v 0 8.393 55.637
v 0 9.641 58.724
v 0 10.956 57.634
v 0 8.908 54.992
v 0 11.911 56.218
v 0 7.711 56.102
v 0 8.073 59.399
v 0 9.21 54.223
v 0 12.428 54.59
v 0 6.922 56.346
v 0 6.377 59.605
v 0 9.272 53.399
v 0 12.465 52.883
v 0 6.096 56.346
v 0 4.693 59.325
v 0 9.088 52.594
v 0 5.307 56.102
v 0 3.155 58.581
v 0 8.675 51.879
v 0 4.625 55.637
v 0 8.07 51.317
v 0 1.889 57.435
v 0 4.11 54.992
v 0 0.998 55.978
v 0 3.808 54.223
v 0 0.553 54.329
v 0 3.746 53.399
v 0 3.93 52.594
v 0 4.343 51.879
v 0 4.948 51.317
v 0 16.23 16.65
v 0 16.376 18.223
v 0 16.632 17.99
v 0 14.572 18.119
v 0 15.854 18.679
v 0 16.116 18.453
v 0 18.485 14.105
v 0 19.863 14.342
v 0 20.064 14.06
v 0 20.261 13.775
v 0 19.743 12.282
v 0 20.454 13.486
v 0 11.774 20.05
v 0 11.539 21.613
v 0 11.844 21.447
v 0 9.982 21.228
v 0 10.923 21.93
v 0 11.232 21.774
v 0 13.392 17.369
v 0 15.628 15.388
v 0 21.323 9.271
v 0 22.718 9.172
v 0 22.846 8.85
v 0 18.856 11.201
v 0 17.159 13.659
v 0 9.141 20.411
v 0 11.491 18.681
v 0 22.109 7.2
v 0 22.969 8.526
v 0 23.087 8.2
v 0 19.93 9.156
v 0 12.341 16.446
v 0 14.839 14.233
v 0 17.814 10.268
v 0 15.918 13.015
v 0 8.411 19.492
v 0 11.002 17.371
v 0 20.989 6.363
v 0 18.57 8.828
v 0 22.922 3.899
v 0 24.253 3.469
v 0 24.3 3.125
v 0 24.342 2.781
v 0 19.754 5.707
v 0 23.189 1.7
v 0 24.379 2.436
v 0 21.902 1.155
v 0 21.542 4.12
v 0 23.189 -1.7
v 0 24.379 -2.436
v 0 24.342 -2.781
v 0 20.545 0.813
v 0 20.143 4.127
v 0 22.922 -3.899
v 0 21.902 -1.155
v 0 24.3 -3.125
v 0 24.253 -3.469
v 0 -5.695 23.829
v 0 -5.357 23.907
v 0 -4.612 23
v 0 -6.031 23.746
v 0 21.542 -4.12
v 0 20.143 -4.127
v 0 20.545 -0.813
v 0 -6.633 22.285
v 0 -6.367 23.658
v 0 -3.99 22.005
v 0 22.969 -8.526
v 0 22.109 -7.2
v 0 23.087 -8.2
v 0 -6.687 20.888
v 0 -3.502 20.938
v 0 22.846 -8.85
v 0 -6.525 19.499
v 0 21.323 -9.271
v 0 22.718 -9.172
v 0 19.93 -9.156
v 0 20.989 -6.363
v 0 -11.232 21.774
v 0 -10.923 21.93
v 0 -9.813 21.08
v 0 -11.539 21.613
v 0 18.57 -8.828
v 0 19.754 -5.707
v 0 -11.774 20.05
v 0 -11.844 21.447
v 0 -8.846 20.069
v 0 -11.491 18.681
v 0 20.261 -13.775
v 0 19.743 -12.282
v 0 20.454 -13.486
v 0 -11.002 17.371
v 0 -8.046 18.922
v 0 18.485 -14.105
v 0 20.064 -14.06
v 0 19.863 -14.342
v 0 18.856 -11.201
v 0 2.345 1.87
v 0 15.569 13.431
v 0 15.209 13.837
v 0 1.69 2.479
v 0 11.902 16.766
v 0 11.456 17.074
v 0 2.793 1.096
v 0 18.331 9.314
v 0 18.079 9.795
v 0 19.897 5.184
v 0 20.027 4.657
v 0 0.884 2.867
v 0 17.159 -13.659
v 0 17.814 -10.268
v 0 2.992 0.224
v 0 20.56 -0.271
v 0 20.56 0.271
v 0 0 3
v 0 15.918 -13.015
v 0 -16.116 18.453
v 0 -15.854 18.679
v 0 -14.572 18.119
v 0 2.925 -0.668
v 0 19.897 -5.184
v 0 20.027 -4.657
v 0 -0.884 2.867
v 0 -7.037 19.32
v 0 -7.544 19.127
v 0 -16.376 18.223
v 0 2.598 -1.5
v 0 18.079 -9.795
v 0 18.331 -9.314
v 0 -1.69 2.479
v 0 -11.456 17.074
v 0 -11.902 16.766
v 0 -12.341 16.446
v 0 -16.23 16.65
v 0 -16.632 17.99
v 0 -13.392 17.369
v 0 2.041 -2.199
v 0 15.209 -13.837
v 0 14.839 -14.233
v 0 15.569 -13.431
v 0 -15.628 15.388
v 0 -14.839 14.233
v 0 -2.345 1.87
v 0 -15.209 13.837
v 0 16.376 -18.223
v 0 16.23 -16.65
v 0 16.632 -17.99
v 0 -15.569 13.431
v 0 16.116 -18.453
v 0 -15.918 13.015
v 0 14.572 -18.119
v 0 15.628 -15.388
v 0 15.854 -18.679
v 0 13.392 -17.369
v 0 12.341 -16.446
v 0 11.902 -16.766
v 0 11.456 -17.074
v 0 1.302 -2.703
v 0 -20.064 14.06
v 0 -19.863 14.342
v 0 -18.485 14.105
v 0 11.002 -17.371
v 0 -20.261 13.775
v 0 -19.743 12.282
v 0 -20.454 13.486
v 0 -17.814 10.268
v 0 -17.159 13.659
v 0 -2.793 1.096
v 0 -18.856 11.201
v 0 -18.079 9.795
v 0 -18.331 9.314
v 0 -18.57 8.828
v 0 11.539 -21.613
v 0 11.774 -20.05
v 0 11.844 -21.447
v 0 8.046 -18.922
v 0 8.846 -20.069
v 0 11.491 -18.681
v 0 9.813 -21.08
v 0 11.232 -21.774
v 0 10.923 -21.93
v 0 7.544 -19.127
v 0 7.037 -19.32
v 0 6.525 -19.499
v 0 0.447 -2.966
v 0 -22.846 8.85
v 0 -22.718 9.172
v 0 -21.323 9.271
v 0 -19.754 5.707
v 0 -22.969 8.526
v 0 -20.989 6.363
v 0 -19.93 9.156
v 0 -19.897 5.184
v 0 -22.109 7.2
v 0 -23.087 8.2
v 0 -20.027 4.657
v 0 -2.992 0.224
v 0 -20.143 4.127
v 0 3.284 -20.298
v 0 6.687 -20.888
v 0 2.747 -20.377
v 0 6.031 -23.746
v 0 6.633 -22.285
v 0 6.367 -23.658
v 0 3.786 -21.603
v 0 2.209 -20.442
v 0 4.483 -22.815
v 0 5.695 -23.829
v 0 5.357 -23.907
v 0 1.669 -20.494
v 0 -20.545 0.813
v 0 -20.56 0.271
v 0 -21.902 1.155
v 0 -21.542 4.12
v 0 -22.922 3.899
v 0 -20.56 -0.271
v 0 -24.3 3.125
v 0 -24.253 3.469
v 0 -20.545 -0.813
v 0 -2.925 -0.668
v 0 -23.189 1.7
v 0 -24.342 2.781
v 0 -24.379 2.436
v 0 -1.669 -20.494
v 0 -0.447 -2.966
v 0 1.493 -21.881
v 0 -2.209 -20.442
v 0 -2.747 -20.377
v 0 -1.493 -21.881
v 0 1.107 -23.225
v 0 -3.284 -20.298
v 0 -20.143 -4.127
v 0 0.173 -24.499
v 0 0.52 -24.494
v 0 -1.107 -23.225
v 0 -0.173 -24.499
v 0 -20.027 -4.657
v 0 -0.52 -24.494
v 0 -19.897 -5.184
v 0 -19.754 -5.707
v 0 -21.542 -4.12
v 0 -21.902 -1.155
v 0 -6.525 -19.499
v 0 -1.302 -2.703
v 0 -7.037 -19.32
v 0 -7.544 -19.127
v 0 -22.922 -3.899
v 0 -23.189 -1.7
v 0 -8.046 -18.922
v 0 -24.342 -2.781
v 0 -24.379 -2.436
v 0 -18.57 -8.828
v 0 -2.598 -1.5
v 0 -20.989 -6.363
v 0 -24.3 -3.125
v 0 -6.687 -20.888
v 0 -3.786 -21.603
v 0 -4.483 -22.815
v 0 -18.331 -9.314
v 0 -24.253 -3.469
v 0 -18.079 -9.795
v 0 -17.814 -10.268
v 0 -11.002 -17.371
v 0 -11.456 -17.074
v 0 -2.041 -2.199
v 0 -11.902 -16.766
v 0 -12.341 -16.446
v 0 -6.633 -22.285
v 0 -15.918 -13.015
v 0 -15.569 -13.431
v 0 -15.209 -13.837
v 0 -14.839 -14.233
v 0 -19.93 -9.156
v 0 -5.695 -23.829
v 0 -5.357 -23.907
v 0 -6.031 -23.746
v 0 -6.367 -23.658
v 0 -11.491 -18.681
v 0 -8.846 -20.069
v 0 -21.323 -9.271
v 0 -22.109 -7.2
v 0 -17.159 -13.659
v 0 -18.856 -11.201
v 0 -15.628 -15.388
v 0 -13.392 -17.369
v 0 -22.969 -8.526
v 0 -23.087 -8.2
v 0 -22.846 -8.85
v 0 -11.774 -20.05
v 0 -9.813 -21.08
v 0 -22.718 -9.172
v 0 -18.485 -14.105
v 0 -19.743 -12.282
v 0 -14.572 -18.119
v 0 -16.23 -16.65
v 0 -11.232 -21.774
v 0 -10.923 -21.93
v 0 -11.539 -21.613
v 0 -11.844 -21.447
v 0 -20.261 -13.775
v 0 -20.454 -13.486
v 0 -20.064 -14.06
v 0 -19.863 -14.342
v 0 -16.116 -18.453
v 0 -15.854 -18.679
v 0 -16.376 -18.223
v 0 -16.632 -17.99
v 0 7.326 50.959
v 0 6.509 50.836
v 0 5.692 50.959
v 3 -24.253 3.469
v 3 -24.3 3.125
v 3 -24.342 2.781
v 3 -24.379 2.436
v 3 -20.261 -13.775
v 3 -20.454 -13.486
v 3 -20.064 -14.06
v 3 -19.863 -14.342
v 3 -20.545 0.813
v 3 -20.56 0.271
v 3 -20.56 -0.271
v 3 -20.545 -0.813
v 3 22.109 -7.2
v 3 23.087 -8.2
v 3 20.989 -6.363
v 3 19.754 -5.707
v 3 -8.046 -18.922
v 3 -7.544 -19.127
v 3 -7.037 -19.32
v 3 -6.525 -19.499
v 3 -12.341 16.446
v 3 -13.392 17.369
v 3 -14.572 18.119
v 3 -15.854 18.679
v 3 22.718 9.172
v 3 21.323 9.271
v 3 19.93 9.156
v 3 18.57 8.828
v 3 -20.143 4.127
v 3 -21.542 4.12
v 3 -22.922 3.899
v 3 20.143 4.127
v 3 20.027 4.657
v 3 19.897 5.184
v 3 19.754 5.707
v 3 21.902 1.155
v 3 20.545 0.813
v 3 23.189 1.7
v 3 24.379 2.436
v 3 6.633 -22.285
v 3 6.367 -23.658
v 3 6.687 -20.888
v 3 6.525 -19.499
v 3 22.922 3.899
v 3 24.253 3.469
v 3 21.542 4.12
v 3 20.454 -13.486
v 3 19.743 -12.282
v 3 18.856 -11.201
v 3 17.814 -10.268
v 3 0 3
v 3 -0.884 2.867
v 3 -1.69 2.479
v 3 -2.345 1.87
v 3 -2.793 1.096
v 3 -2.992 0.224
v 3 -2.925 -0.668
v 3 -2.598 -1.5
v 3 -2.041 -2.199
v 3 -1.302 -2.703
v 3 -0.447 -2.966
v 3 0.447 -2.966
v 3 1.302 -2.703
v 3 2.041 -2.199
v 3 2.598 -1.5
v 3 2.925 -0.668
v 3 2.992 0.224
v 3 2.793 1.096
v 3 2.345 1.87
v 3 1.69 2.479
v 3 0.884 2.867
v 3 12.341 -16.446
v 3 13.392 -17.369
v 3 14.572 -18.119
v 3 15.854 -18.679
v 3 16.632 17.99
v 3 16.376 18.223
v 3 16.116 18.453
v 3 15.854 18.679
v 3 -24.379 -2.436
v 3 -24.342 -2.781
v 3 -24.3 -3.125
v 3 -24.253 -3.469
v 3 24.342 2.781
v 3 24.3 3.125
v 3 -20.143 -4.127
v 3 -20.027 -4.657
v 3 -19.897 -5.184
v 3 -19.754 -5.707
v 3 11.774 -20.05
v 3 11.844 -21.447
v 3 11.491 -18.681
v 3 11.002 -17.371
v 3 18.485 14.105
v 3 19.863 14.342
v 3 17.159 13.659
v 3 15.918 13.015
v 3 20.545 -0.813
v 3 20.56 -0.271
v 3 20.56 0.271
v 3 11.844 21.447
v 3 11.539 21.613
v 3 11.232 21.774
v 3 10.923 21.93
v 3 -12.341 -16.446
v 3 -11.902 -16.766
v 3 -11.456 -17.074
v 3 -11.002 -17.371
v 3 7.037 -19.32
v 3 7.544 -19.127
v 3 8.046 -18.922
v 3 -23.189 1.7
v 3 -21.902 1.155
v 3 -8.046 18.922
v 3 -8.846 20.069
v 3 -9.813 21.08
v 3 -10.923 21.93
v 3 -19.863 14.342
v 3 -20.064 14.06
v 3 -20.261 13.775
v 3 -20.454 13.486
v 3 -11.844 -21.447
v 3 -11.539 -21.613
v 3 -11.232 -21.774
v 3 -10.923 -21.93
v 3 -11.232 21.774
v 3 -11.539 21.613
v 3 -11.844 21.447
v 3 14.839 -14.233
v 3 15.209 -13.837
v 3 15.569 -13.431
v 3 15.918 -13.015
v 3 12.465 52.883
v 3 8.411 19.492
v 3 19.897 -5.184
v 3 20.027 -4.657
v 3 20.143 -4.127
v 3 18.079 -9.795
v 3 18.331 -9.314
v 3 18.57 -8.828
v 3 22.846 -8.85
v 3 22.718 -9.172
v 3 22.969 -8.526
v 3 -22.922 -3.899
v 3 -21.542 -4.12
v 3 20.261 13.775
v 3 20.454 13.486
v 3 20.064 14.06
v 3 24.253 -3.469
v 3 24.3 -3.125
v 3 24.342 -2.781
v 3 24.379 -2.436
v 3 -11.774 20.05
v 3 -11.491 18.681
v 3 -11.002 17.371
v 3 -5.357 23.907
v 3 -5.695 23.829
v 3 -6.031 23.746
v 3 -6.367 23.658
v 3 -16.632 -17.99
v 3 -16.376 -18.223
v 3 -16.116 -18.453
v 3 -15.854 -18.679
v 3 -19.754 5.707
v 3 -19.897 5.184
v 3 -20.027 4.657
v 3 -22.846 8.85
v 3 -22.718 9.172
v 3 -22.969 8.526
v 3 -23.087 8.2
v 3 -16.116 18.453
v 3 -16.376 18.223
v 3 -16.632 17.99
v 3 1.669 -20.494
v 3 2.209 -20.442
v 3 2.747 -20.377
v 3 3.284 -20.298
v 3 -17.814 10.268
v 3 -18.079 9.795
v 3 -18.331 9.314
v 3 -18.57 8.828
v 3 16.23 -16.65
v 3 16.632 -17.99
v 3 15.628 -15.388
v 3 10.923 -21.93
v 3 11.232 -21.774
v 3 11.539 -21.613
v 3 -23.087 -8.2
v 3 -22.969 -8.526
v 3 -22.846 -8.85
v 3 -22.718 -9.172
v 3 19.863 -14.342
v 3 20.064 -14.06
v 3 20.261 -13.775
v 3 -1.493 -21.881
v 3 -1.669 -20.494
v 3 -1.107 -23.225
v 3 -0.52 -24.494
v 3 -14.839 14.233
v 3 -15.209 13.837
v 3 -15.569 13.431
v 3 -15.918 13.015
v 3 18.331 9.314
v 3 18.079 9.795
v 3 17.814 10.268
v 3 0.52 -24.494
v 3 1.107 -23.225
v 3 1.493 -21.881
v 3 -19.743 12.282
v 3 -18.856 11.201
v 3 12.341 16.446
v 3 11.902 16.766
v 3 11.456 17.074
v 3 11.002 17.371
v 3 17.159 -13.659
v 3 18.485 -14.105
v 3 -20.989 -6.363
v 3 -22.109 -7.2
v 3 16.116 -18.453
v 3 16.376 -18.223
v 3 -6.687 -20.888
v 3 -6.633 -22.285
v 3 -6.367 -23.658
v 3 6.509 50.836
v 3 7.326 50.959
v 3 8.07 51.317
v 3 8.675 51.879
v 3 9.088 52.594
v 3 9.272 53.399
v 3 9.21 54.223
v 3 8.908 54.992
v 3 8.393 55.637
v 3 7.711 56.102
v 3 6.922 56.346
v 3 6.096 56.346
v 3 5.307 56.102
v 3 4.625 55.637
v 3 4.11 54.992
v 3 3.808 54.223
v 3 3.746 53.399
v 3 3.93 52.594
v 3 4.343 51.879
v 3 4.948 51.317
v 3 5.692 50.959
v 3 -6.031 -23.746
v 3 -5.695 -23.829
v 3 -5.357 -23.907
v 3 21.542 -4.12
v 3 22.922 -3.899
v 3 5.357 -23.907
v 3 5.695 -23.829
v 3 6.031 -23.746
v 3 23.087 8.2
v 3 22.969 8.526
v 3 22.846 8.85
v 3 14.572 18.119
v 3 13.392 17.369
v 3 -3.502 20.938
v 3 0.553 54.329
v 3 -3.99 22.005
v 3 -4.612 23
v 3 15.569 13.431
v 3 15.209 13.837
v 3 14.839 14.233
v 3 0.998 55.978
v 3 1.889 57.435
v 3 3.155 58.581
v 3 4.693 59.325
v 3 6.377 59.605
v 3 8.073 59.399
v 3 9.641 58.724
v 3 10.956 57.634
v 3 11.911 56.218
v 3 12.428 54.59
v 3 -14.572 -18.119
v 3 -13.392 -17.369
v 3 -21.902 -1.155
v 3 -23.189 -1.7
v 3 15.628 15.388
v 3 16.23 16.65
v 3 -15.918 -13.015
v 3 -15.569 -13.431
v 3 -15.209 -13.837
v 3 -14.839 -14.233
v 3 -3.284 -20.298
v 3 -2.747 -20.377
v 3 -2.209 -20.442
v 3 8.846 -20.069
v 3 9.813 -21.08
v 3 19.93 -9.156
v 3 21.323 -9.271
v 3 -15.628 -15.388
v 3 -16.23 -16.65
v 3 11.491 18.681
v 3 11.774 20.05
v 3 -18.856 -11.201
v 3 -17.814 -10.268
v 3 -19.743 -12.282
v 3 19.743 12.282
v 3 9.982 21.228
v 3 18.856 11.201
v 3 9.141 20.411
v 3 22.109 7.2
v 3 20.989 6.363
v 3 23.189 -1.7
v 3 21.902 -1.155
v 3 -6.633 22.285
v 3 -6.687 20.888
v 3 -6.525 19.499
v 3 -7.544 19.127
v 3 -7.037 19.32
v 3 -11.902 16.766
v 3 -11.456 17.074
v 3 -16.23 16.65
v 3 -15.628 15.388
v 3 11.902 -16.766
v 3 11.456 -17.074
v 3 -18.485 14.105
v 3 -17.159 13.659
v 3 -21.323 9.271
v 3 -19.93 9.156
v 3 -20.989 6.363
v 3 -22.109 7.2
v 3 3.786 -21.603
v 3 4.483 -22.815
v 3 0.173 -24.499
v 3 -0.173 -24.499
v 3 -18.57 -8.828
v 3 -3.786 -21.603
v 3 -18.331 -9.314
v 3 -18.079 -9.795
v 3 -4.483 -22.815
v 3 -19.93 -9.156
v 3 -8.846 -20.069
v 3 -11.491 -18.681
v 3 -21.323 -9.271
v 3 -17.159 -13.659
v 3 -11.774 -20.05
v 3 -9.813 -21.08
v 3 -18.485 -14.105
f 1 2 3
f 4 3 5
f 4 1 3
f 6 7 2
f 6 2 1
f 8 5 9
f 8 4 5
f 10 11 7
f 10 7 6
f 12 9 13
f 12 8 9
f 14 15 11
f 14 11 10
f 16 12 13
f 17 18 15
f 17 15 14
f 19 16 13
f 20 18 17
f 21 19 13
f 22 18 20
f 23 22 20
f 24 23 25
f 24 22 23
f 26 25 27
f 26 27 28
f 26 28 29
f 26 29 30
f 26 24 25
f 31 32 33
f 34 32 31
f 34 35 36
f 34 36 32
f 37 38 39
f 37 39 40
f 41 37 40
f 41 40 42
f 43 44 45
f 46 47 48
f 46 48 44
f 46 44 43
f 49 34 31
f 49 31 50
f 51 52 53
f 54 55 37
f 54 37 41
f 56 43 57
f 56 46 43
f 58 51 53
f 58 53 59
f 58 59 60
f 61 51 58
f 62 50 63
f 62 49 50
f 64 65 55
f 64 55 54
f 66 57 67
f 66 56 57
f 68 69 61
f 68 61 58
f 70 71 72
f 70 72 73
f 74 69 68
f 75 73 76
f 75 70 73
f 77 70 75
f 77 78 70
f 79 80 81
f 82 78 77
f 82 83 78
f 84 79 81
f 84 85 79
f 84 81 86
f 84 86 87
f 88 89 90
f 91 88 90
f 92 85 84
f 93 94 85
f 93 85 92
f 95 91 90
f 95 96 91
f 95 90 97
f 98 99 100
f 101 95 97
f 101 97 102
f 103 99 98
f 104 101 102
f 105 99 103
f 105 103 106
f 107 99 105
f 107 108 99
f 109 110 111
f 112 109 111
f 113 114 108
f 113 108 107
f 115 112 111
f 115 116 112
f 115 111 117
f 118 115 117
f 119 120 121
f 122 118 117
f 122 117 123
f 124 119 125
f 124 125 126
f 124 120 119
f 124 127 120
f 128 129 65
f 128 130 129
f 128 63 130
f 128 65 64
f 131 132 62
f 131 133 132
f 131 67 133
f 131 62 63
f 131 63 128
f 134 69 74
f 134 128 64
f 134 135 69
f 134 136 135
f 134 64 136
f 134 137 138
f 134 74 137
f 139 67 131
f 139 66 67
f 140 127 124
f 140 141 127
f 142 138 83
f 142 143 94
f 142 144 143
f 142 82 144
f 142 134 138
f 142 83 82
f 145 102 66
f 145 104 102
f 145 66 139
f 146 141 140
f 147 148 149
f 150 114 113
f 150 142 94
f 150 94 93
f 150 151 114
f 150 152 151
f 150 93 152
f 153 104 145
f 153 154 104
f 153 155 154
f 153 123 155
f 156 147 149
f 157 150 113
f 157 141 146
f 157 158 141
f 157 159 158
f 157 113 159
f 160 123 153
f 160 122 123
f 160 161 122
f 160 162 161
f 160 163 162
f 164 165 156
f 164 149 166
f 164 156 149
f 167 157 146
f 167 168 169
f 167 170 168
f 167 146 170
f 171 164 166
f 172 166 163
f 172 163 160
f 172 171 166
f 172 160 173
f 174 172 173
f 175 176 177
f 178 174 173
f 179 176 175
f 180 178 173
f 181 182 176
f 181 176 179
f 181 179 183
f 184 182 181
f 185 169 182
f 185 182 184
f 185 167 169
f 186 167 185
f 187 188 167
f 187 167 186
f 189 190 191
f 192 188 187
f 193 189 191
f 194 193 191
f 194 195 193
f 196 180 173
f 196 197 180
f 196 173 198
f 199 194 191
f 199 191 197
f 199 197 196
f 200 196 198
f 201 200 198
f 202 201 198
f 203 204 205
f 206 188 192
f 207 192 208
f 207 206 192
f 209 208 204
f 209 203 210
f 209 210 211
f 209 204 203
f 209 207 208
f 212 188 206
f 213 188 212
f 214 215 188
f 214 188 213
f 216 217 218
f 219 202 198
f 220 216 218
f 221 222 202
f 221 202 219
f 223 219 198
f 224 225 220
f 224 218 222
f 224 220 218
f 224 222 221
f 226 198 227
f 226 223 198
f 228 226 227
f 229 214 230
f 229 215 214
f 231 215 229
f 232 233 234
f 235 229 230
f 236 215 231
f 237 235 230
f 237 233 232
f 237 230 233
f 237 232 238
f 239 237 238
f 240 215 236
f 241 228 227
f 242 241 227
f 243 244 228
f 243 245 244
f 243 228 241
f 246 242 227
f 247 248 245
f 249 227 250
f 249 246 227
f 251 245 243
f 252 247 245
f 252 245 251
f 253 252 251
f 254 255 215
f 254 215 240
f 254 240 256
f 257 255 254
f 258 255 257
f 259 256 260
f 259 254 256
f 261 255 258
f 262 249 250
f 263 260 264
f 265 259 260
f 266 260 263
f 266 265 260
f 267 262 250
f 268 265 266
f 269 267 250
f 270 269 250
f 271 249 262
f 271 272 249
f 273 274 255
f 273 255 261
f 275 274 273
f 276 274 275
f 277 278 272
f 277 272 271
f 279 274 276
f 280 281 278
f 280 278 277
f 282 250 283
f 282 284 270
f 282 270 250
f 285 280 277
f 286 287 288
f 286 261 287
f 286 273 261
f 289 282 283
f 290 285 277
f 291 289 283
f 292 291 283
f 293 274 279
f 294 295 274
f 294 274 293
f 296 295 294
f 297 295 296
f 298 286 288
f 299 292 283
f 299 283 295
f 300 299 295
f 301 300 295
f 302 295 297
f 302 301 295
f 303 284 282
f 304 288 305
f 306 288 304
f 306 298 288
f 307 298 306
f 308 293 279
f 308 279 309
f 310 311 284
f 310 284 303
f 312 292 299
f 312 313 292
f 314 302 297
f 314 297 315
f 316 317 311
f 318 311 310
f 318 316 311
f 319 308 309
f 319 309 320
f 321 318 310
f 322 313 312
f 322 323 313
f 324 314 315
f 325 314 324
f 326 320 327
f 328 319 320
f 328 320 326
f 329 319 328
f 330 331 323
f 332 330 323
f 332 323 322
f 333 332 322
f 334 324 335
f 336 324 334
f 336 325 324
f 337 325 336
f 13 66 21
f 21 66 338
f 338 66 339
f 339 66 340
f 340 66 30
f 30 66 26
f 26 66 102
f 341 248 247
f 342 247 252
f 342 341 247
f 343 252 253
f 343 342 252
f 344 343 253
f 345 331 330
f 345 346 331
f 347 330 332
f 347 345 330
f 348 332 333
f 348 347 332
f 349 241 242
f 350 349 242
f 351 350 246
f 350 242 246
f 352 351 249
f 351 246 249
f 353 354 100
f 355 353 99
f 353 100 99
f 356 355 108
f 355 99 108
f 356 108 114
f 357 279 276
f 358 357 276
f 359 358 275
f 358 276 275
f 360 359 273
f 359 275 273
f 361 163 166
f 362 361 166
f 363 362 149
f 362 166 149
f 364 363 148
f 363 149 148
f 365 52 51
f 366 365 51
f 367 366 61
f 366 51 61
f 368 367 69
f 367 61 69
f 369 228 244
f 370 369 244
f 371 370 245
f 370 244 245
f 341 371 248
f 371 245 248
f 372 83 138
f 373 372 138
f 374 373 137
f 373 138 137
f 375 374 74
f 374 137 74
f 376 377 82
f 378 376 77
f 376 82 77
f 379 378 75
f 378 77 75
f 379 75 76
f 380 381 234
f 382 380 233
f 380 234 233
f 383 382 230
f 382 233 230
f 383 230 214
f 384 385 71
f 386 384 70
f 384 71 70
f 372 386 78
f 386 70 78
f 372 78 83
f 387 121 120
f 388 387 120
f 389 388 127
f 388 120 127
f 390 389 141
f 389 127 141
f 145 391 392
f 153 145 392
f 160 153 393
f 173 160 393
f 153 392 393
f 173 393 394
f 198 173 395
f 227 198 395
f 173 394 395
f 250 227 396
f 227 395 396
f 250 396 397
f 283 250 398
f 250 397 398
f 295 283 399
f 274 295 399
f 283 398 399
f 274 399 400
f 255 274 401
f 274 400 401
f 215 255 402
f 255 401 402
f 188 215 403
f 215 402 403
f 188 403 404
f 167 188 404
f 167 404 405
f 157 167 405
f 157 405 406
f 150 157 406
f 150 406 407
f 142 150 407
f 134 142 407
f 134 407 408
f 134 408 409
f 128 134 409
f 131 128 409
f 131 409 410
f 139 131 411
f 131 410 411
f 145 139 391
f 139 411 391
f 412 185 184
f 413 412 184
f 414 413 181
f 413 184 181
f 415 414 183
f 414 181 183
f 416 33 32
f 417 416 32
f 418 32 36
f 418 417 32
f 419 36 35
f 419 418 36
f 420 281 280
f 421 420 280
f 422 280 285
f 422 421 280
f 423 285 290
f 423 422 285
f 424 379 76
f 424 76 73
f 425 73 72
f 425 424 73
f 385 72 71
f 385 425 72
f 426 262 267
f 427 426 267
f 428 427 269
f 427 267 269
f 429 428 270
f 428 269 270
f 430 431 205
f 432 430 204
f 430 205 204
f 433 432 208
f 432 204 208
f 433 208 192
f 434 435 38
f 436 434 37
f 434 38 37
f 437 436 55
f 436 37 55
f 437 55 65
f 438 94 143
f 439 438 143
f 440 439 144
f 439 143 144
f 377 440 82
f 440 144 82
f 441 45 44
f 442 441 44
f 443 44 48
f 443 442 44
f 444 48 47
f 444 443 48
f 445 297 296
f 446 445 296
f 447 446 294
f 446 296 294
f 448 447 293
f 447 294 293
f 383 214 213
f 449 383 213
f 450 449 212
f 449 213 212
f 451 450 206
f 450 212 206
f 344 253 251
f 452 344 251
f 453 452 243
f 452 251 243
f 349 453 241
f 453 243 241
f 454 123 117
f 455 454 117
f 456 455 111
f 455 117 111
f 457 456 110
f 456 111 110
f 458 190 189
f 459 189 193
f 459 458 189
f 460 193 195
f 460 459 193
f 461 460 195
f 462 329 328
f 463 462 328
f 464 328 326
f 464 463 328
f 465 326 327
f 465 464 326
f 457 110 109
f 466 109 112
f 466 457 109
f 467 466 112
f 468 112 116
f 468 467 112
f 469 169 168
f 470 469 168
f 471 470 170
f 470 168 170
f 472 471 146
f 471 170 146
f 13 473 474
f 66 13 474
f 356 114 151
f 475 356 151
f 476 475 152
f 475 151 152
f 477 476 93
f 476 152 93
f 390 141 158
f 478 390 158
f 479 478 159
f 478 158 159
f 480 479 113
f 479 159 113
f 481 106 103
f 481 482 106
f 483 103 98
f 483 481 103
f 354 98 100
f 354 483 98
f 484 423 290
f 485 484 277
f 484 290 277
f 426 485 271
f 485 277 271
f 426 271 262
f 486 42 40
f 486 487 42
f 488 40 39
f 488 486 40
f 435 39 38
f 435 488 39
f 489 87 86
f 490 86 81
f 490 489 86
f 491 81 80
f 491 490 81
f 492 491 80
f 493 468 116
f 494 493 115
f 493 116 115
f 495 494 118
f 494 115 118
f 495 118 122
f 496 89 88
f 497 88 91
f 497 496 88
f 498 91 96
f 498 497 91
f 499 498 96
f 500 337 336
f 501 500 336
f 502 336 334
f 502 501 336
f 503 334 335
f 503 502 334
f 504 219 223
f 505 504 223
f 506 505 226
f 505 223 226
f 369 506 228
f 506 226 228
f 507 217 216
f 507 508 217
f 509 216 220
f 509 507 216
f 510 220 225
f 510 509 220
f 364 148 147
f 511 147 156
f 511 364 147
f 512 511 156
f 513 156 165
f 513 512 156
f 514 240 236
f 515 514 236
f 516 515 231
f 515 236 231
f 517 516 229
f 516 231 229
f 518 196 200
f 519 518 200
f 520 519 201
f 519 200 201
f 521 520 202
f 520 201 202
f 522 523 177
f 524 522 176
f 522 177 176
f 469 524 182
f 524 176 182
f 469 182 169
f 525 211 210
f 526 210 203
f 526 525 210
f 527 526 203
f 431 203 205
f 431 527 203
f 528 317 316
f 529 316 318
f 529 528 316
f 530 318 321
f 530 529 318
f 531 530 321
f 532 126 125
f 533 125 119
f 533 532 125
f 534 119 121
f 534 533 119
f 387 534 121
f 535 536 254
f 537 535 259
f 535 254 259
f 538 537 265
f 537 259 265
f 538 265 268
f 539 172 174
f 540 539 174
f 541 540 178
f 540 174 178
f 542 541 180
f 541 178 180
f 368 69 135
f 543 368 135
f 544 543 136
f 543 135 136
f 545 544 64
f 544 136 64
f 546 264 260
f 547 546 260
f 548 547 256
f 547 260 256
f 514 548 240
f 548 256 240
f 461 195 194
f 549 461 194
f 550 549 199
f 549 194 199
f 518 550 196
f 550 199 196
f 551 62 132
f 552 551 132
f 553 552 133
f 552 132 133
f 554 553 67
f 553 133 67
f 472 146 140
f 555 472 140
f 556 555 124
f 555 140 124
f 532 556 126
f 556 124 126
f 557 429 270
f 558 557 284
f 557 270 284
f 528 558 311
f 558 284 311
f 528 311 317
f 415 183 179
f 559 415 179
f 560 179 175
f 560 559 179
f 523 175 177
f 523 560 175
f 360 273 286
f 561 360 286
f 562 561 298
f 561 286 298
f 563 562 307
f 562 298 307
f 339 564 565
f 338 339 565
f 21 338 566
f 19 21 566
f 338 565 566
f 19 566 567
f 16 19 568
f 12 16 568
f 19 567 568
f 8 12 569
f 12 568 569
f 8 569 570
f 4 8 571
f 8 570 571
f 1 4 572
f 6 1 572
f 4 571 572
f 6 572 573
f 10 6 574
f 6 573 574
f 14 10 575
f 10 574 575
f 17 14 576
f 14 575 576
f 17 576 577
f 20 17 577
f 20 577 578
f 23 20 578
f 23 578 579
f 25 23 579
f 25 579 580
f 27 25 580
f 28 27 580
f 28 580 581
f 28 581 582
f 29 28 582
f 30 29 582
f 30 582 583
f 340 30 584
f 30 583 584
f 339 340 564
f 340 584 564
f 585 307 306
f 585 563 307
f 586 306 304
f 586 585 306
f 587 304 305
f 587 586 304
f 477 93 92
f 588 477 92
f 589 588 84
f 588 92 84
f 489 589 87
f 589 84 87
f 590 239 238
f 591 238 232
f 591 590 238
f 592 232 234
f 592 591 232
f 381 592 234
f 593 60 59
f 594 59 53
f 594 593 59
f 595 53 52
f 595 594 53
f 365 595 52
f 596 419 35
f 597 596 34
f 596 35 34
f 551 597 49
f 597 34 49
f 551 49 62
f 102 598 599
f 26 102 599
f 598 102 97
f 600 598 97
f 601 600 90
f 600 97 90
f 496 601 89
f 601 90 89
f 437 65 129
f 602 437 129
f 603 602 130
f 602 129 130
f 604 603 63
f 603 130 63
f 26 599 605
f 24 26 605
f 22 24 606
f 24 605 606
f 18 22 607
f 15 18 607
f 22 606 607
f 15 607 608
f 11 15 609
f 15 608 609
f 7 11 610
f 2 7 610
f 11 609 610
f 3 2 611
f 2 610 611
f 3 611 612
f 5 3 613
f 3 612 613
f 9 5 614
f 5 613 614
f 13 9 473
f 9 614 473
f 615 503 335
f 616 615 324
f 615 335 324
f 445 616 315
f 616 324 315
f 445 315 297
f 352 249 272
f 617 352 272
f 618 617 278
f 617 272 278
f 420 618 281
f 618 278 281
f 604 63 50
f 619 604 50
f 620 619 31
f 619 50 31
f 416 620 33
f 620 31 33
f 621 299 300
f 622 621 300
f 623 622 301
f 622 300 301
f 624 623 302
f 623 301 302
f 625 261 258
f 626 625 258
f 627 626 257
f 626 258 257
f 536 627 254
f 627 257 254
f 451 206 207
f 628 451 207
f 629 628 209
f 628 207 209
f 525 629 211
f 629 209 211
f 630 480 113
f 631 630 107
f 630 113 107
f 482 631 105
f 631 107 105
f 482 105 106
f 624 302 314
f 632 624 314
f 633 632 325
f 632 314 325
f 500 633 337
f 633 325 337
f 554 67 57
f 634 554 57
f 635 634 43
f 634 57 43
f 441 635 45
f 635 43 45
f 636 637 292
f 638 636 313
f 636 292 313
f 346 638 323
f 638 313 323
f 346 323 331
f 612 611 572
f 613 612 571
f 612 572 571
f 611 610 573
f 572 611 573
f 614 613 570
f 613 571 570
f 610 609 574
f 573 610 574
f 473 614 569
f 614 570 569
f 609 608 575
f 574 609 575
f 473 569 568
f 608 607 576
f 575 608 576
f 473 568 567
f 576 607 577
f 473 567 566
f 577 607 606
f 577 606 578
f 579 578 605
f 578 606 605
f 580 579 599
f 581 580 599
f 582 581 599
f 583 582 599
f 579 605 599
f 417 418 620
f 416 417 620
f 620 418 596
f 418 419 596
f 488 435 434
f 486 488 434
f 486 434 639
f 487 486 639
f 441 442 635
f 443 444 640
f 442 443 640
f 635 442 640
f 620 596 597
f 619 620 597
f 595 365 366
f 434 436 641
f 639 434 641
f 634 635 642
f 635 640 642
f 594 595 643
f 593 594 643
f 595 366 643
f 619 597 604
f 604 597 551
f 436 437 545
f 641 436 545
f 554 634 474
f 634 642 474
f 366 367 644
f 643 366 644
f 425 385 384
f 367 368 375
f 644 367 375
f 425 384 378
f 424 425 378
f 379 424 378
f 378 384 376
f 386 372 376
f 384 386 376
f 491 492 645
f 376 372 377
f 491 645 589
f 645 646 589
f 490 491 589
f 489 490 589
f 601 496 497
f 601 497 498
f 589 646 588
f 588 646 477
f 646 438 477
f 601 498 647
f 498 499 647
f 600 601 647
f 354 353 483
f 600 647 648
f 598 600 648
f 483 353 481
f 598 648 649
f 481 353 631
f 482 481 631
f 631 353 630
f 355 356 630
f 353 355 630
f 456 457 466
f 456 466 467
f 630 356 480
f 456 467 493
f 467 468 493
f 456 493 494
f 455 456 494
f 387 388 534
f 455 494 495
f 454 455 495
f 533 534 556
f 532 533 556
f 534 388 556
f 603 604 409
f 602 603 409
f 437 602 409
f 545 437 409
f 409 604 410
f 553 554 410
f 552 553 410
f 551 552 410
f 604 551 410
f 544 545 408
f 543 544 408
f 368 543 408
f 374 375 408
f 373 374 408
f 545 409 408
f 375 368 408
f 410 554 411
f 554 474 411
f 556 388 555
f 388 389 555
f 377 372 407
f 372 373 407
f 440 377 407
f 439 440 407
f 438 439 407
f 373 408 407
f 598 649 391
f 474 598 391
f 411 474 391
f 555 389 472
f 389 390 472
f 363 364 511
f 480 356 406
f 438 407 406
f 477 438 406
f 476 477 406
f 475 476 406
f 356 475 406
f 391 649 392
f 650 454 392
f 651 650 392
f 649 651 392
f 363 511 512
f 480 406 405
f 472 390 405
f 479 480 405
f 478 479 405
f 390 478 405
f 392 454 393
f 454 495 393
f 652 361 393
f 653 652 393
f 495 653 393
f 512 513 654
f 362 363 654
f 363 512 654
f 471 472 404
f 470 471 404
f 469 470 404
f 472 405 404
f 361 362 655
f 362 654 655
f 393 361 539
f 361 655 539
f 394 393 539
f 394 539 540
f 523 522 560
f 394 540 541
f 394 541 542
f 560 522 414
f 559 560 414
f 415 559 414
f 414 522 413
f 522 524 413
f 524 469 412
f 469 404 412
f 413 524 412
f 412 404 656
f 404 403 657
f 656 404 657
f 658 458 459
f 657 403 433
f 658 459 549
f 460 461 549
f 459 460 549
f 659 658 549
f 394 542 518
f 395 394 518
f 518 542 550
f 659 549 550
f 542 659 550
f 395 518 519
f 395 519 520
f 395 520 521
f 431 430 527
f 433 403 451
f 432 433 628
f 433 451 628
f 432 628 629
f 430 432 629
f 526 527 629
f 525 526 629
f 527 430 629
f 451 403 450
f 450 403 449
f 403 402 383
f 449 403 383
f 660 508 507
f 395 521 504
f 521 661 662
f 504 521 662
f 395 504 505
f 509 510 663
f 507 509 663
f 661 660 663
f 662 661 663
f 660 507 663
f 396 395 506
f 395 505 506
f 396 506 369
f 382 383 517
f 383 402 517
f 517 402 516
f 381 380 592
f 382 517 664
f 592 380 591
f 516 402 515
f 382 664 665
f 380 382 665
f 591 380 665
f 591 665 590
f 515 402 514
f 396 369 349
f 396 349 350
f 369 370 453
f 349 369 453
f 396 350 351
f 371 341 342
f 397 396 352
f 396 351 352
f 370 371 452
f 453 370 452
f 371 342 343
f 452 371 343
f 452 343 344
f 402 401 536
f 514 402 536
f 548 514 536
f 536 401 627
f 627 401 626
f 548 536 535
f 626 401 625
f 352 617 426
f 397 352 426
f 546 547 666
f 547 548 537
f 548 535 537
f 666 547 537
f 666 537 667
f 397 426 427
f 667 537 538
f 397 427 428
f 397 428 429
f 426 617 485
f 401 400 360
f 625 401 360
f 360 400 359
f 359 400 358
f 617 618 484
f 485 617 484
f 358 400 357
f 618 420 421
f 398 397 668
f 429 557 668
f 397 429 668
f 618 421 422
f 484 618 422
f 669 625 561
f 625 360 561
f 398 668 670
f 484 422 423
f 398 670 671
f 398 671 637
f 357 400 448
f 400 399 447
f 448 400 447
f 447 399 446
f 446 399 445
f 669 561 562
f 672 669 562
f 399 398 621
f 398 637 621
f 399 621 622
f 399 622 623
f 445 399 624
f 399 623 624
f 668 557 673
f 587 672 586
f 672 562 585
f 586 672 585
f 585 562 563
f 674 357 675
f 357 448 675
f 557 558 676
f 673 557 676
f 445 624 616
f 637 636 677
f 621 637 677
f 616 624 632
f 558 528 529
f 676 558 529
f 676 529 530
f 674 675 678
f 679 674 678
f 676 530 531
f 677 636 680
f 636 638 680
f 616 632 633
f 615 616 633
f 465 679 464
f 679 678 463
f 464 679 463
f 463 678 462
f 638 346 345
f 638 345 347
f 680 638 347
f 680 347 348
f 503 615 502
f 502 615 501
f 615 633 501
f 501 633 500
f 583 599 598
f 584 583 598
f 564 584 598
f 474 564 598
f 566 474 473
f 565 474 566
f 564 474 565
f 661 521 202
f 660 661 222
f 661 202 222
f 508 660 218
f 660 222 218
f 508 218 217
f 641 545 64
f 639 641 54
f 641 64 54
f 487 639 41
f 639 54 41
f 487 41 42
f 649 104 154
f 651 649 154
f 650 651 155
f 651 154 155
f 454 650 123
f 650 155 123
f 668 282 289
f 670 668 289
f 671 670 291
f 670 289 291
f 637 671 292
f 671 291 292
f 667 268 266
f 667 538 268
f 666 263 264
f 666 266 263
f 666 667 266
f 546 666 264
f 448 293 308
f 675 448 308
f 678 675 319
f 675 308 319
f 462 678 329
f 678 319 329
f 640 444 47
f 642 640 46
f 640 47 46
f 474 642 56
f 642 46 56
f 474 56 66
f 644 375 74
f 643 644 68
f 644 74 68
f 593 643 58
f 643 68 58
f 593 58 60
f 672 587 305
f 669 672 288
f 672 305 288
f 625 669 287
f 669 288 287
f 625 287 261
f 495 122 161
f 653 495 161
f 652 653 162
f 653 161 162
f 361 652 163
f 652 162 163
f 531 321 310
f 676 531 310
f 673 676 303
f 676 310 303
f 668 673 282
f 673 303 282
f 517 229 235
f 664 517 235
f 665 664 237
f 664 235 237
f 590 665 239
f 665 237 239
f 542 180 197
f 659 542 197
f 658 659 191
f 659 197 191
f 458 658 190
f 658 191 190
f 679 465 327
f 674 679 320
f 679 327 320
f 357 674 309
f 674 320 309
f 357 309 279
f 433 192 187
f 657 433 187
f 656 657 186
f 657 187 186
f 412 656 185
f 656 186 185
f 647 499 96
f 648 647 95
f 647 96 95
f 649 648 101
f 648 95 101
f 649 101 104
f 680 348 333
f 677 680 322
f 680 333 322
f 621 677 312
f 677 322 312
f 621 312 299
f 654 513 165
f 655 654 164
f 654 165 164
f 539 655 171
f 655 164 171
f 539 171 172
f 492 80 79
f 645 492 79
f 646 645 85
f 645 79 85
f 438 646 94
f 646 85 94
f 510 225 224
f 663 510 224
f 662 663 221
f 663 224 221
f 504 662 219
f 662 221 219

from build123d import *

# Parameters (mm, degrees)
BASPROSKE_W         = 3
BASPROSKE_H         = 24.5
TOOTHCUT_DEPTH      = 35.777866525
TEETHCUTS_COUNT     = 26
TEETHCUTS_ANGLE     = 346.153846154
BORSKE_R            = 3
BORE_DEPTH          = 50.0000508
BOSS_EXTRUDE1_START = 3
SKETCH1_R           = 2.770499524
SKETCH1_R_2         = 3
BOSS_EXTRUDE1_DEPTH = 3


with BuildPart() as part:
    # BasProSke → Base-Revolve (revolve)
    with BuildSketch(Plane(origin=(0, 0, 0), x_dir=(1, 0, 0), z_dir=(0, 1, 0)), mode=Mode.PRIVATE) as base_revolve_sk:
        with Locations((1.5, 12.25)):
            Rectangle(BASPROSKE_W, BASPROSKE_H)
    revolve(base_revolve_sk.sketch.rotate(Axis((-10, 0, 0), (1, 0, 0)), 180), axis=Axis((-10, 0, 0), (1, 0, 0)))

    # TooCutSke → ToothCut (cut, through all)
    with BuildSketch(Plane(origin=(0, 0, 0), x_dir=(0, 0, -1), z_dir=(1, 0, 0))):
        with BuildLine():
            ThreePointArc((0.813448928, 20.545402967), (0, 20.5615), (-0.813448928, 20.545402967))
            ThreePointArc((-0.813448928, 20.545402967), (-1.408477569, 22.569593712), (-2.4536582, 24.402352481))
            ThreePointArc((-2.4536582, 24.402352481), (0, 24.5254), (2.4536582, 24.402352481))
            ThreePointArc((2.4536582, 24.402352481), (1.408477569, 22.569593712), (0.813448928, 20.545402967))
        make_face()
    toothcut = extrude(amount=TOOTHCUT_DEPTH, mode=Mode.SUBTRACT)

    # TeethCuts: ToothCut ×26 about axis
    teethcuts_axis = Axis((-10, 0, 0), (1, 0, 0))
    for i in range(1, TEETHCUTS_COUNT):
        add(toothcut.rotate(teethcuts_axis, i * TEETHCUTS_ANGLE / (TEETHCUTS_COUNT - 1)), mode=Mode.SUBTRACT)

    # BorSke → Bore (cut, symmetric)
    with BuildSketch(Plane(origin=(0, 0, 0), x_dir=(0, 0, -1), z_dir=(1, 0, 0))):
        with Locations(Location((0, 0, 0), (0, 0, 180))):
            Circle(BORSKE_R)
    extrude(amount=BORE_DEPTH, both=True, mode=Mode.SUBTRACT)

    # Sketch1 → Boss-Extrude1 (add)
    with BuildSketch(Plane(origin=(0, 0, 0), x_dir=(0, 0, -1), z_dir=(1, 0, 0)).offset(BOSS_EXTRUDE1_START)):
        with BuildLine():
            Line((-0.723220082, -5.956253245), (-54.329499283, 0.552727489))
            ThreePointArc((-54.329499283, 0.552727489), (-59.562532446, 7.232200815), (-52.88305912, 12.465233978))
            Line((-52.88305912, 12.465233978), (0.723220082, 5.956253245))
            ThreePointArc((0.723220082, 5.956253245), (5.956253245, -0.723220082), (-0.723220082, -5.956253245))
        make_face()
        with Locations((-53.606279201, 6.508980734)):
            Circle(SKETCH1_R, mode=Mode.SUBTRACT)
        with Locations(Location((0, 0, 0), (0, 0, 180))):
            Circle(SKETCH1_R_2, mode=Mode.SUBTRACT)
    extrude(amount=-BOSS_EXTRUDE1_DEPTH)


solid = part.part
